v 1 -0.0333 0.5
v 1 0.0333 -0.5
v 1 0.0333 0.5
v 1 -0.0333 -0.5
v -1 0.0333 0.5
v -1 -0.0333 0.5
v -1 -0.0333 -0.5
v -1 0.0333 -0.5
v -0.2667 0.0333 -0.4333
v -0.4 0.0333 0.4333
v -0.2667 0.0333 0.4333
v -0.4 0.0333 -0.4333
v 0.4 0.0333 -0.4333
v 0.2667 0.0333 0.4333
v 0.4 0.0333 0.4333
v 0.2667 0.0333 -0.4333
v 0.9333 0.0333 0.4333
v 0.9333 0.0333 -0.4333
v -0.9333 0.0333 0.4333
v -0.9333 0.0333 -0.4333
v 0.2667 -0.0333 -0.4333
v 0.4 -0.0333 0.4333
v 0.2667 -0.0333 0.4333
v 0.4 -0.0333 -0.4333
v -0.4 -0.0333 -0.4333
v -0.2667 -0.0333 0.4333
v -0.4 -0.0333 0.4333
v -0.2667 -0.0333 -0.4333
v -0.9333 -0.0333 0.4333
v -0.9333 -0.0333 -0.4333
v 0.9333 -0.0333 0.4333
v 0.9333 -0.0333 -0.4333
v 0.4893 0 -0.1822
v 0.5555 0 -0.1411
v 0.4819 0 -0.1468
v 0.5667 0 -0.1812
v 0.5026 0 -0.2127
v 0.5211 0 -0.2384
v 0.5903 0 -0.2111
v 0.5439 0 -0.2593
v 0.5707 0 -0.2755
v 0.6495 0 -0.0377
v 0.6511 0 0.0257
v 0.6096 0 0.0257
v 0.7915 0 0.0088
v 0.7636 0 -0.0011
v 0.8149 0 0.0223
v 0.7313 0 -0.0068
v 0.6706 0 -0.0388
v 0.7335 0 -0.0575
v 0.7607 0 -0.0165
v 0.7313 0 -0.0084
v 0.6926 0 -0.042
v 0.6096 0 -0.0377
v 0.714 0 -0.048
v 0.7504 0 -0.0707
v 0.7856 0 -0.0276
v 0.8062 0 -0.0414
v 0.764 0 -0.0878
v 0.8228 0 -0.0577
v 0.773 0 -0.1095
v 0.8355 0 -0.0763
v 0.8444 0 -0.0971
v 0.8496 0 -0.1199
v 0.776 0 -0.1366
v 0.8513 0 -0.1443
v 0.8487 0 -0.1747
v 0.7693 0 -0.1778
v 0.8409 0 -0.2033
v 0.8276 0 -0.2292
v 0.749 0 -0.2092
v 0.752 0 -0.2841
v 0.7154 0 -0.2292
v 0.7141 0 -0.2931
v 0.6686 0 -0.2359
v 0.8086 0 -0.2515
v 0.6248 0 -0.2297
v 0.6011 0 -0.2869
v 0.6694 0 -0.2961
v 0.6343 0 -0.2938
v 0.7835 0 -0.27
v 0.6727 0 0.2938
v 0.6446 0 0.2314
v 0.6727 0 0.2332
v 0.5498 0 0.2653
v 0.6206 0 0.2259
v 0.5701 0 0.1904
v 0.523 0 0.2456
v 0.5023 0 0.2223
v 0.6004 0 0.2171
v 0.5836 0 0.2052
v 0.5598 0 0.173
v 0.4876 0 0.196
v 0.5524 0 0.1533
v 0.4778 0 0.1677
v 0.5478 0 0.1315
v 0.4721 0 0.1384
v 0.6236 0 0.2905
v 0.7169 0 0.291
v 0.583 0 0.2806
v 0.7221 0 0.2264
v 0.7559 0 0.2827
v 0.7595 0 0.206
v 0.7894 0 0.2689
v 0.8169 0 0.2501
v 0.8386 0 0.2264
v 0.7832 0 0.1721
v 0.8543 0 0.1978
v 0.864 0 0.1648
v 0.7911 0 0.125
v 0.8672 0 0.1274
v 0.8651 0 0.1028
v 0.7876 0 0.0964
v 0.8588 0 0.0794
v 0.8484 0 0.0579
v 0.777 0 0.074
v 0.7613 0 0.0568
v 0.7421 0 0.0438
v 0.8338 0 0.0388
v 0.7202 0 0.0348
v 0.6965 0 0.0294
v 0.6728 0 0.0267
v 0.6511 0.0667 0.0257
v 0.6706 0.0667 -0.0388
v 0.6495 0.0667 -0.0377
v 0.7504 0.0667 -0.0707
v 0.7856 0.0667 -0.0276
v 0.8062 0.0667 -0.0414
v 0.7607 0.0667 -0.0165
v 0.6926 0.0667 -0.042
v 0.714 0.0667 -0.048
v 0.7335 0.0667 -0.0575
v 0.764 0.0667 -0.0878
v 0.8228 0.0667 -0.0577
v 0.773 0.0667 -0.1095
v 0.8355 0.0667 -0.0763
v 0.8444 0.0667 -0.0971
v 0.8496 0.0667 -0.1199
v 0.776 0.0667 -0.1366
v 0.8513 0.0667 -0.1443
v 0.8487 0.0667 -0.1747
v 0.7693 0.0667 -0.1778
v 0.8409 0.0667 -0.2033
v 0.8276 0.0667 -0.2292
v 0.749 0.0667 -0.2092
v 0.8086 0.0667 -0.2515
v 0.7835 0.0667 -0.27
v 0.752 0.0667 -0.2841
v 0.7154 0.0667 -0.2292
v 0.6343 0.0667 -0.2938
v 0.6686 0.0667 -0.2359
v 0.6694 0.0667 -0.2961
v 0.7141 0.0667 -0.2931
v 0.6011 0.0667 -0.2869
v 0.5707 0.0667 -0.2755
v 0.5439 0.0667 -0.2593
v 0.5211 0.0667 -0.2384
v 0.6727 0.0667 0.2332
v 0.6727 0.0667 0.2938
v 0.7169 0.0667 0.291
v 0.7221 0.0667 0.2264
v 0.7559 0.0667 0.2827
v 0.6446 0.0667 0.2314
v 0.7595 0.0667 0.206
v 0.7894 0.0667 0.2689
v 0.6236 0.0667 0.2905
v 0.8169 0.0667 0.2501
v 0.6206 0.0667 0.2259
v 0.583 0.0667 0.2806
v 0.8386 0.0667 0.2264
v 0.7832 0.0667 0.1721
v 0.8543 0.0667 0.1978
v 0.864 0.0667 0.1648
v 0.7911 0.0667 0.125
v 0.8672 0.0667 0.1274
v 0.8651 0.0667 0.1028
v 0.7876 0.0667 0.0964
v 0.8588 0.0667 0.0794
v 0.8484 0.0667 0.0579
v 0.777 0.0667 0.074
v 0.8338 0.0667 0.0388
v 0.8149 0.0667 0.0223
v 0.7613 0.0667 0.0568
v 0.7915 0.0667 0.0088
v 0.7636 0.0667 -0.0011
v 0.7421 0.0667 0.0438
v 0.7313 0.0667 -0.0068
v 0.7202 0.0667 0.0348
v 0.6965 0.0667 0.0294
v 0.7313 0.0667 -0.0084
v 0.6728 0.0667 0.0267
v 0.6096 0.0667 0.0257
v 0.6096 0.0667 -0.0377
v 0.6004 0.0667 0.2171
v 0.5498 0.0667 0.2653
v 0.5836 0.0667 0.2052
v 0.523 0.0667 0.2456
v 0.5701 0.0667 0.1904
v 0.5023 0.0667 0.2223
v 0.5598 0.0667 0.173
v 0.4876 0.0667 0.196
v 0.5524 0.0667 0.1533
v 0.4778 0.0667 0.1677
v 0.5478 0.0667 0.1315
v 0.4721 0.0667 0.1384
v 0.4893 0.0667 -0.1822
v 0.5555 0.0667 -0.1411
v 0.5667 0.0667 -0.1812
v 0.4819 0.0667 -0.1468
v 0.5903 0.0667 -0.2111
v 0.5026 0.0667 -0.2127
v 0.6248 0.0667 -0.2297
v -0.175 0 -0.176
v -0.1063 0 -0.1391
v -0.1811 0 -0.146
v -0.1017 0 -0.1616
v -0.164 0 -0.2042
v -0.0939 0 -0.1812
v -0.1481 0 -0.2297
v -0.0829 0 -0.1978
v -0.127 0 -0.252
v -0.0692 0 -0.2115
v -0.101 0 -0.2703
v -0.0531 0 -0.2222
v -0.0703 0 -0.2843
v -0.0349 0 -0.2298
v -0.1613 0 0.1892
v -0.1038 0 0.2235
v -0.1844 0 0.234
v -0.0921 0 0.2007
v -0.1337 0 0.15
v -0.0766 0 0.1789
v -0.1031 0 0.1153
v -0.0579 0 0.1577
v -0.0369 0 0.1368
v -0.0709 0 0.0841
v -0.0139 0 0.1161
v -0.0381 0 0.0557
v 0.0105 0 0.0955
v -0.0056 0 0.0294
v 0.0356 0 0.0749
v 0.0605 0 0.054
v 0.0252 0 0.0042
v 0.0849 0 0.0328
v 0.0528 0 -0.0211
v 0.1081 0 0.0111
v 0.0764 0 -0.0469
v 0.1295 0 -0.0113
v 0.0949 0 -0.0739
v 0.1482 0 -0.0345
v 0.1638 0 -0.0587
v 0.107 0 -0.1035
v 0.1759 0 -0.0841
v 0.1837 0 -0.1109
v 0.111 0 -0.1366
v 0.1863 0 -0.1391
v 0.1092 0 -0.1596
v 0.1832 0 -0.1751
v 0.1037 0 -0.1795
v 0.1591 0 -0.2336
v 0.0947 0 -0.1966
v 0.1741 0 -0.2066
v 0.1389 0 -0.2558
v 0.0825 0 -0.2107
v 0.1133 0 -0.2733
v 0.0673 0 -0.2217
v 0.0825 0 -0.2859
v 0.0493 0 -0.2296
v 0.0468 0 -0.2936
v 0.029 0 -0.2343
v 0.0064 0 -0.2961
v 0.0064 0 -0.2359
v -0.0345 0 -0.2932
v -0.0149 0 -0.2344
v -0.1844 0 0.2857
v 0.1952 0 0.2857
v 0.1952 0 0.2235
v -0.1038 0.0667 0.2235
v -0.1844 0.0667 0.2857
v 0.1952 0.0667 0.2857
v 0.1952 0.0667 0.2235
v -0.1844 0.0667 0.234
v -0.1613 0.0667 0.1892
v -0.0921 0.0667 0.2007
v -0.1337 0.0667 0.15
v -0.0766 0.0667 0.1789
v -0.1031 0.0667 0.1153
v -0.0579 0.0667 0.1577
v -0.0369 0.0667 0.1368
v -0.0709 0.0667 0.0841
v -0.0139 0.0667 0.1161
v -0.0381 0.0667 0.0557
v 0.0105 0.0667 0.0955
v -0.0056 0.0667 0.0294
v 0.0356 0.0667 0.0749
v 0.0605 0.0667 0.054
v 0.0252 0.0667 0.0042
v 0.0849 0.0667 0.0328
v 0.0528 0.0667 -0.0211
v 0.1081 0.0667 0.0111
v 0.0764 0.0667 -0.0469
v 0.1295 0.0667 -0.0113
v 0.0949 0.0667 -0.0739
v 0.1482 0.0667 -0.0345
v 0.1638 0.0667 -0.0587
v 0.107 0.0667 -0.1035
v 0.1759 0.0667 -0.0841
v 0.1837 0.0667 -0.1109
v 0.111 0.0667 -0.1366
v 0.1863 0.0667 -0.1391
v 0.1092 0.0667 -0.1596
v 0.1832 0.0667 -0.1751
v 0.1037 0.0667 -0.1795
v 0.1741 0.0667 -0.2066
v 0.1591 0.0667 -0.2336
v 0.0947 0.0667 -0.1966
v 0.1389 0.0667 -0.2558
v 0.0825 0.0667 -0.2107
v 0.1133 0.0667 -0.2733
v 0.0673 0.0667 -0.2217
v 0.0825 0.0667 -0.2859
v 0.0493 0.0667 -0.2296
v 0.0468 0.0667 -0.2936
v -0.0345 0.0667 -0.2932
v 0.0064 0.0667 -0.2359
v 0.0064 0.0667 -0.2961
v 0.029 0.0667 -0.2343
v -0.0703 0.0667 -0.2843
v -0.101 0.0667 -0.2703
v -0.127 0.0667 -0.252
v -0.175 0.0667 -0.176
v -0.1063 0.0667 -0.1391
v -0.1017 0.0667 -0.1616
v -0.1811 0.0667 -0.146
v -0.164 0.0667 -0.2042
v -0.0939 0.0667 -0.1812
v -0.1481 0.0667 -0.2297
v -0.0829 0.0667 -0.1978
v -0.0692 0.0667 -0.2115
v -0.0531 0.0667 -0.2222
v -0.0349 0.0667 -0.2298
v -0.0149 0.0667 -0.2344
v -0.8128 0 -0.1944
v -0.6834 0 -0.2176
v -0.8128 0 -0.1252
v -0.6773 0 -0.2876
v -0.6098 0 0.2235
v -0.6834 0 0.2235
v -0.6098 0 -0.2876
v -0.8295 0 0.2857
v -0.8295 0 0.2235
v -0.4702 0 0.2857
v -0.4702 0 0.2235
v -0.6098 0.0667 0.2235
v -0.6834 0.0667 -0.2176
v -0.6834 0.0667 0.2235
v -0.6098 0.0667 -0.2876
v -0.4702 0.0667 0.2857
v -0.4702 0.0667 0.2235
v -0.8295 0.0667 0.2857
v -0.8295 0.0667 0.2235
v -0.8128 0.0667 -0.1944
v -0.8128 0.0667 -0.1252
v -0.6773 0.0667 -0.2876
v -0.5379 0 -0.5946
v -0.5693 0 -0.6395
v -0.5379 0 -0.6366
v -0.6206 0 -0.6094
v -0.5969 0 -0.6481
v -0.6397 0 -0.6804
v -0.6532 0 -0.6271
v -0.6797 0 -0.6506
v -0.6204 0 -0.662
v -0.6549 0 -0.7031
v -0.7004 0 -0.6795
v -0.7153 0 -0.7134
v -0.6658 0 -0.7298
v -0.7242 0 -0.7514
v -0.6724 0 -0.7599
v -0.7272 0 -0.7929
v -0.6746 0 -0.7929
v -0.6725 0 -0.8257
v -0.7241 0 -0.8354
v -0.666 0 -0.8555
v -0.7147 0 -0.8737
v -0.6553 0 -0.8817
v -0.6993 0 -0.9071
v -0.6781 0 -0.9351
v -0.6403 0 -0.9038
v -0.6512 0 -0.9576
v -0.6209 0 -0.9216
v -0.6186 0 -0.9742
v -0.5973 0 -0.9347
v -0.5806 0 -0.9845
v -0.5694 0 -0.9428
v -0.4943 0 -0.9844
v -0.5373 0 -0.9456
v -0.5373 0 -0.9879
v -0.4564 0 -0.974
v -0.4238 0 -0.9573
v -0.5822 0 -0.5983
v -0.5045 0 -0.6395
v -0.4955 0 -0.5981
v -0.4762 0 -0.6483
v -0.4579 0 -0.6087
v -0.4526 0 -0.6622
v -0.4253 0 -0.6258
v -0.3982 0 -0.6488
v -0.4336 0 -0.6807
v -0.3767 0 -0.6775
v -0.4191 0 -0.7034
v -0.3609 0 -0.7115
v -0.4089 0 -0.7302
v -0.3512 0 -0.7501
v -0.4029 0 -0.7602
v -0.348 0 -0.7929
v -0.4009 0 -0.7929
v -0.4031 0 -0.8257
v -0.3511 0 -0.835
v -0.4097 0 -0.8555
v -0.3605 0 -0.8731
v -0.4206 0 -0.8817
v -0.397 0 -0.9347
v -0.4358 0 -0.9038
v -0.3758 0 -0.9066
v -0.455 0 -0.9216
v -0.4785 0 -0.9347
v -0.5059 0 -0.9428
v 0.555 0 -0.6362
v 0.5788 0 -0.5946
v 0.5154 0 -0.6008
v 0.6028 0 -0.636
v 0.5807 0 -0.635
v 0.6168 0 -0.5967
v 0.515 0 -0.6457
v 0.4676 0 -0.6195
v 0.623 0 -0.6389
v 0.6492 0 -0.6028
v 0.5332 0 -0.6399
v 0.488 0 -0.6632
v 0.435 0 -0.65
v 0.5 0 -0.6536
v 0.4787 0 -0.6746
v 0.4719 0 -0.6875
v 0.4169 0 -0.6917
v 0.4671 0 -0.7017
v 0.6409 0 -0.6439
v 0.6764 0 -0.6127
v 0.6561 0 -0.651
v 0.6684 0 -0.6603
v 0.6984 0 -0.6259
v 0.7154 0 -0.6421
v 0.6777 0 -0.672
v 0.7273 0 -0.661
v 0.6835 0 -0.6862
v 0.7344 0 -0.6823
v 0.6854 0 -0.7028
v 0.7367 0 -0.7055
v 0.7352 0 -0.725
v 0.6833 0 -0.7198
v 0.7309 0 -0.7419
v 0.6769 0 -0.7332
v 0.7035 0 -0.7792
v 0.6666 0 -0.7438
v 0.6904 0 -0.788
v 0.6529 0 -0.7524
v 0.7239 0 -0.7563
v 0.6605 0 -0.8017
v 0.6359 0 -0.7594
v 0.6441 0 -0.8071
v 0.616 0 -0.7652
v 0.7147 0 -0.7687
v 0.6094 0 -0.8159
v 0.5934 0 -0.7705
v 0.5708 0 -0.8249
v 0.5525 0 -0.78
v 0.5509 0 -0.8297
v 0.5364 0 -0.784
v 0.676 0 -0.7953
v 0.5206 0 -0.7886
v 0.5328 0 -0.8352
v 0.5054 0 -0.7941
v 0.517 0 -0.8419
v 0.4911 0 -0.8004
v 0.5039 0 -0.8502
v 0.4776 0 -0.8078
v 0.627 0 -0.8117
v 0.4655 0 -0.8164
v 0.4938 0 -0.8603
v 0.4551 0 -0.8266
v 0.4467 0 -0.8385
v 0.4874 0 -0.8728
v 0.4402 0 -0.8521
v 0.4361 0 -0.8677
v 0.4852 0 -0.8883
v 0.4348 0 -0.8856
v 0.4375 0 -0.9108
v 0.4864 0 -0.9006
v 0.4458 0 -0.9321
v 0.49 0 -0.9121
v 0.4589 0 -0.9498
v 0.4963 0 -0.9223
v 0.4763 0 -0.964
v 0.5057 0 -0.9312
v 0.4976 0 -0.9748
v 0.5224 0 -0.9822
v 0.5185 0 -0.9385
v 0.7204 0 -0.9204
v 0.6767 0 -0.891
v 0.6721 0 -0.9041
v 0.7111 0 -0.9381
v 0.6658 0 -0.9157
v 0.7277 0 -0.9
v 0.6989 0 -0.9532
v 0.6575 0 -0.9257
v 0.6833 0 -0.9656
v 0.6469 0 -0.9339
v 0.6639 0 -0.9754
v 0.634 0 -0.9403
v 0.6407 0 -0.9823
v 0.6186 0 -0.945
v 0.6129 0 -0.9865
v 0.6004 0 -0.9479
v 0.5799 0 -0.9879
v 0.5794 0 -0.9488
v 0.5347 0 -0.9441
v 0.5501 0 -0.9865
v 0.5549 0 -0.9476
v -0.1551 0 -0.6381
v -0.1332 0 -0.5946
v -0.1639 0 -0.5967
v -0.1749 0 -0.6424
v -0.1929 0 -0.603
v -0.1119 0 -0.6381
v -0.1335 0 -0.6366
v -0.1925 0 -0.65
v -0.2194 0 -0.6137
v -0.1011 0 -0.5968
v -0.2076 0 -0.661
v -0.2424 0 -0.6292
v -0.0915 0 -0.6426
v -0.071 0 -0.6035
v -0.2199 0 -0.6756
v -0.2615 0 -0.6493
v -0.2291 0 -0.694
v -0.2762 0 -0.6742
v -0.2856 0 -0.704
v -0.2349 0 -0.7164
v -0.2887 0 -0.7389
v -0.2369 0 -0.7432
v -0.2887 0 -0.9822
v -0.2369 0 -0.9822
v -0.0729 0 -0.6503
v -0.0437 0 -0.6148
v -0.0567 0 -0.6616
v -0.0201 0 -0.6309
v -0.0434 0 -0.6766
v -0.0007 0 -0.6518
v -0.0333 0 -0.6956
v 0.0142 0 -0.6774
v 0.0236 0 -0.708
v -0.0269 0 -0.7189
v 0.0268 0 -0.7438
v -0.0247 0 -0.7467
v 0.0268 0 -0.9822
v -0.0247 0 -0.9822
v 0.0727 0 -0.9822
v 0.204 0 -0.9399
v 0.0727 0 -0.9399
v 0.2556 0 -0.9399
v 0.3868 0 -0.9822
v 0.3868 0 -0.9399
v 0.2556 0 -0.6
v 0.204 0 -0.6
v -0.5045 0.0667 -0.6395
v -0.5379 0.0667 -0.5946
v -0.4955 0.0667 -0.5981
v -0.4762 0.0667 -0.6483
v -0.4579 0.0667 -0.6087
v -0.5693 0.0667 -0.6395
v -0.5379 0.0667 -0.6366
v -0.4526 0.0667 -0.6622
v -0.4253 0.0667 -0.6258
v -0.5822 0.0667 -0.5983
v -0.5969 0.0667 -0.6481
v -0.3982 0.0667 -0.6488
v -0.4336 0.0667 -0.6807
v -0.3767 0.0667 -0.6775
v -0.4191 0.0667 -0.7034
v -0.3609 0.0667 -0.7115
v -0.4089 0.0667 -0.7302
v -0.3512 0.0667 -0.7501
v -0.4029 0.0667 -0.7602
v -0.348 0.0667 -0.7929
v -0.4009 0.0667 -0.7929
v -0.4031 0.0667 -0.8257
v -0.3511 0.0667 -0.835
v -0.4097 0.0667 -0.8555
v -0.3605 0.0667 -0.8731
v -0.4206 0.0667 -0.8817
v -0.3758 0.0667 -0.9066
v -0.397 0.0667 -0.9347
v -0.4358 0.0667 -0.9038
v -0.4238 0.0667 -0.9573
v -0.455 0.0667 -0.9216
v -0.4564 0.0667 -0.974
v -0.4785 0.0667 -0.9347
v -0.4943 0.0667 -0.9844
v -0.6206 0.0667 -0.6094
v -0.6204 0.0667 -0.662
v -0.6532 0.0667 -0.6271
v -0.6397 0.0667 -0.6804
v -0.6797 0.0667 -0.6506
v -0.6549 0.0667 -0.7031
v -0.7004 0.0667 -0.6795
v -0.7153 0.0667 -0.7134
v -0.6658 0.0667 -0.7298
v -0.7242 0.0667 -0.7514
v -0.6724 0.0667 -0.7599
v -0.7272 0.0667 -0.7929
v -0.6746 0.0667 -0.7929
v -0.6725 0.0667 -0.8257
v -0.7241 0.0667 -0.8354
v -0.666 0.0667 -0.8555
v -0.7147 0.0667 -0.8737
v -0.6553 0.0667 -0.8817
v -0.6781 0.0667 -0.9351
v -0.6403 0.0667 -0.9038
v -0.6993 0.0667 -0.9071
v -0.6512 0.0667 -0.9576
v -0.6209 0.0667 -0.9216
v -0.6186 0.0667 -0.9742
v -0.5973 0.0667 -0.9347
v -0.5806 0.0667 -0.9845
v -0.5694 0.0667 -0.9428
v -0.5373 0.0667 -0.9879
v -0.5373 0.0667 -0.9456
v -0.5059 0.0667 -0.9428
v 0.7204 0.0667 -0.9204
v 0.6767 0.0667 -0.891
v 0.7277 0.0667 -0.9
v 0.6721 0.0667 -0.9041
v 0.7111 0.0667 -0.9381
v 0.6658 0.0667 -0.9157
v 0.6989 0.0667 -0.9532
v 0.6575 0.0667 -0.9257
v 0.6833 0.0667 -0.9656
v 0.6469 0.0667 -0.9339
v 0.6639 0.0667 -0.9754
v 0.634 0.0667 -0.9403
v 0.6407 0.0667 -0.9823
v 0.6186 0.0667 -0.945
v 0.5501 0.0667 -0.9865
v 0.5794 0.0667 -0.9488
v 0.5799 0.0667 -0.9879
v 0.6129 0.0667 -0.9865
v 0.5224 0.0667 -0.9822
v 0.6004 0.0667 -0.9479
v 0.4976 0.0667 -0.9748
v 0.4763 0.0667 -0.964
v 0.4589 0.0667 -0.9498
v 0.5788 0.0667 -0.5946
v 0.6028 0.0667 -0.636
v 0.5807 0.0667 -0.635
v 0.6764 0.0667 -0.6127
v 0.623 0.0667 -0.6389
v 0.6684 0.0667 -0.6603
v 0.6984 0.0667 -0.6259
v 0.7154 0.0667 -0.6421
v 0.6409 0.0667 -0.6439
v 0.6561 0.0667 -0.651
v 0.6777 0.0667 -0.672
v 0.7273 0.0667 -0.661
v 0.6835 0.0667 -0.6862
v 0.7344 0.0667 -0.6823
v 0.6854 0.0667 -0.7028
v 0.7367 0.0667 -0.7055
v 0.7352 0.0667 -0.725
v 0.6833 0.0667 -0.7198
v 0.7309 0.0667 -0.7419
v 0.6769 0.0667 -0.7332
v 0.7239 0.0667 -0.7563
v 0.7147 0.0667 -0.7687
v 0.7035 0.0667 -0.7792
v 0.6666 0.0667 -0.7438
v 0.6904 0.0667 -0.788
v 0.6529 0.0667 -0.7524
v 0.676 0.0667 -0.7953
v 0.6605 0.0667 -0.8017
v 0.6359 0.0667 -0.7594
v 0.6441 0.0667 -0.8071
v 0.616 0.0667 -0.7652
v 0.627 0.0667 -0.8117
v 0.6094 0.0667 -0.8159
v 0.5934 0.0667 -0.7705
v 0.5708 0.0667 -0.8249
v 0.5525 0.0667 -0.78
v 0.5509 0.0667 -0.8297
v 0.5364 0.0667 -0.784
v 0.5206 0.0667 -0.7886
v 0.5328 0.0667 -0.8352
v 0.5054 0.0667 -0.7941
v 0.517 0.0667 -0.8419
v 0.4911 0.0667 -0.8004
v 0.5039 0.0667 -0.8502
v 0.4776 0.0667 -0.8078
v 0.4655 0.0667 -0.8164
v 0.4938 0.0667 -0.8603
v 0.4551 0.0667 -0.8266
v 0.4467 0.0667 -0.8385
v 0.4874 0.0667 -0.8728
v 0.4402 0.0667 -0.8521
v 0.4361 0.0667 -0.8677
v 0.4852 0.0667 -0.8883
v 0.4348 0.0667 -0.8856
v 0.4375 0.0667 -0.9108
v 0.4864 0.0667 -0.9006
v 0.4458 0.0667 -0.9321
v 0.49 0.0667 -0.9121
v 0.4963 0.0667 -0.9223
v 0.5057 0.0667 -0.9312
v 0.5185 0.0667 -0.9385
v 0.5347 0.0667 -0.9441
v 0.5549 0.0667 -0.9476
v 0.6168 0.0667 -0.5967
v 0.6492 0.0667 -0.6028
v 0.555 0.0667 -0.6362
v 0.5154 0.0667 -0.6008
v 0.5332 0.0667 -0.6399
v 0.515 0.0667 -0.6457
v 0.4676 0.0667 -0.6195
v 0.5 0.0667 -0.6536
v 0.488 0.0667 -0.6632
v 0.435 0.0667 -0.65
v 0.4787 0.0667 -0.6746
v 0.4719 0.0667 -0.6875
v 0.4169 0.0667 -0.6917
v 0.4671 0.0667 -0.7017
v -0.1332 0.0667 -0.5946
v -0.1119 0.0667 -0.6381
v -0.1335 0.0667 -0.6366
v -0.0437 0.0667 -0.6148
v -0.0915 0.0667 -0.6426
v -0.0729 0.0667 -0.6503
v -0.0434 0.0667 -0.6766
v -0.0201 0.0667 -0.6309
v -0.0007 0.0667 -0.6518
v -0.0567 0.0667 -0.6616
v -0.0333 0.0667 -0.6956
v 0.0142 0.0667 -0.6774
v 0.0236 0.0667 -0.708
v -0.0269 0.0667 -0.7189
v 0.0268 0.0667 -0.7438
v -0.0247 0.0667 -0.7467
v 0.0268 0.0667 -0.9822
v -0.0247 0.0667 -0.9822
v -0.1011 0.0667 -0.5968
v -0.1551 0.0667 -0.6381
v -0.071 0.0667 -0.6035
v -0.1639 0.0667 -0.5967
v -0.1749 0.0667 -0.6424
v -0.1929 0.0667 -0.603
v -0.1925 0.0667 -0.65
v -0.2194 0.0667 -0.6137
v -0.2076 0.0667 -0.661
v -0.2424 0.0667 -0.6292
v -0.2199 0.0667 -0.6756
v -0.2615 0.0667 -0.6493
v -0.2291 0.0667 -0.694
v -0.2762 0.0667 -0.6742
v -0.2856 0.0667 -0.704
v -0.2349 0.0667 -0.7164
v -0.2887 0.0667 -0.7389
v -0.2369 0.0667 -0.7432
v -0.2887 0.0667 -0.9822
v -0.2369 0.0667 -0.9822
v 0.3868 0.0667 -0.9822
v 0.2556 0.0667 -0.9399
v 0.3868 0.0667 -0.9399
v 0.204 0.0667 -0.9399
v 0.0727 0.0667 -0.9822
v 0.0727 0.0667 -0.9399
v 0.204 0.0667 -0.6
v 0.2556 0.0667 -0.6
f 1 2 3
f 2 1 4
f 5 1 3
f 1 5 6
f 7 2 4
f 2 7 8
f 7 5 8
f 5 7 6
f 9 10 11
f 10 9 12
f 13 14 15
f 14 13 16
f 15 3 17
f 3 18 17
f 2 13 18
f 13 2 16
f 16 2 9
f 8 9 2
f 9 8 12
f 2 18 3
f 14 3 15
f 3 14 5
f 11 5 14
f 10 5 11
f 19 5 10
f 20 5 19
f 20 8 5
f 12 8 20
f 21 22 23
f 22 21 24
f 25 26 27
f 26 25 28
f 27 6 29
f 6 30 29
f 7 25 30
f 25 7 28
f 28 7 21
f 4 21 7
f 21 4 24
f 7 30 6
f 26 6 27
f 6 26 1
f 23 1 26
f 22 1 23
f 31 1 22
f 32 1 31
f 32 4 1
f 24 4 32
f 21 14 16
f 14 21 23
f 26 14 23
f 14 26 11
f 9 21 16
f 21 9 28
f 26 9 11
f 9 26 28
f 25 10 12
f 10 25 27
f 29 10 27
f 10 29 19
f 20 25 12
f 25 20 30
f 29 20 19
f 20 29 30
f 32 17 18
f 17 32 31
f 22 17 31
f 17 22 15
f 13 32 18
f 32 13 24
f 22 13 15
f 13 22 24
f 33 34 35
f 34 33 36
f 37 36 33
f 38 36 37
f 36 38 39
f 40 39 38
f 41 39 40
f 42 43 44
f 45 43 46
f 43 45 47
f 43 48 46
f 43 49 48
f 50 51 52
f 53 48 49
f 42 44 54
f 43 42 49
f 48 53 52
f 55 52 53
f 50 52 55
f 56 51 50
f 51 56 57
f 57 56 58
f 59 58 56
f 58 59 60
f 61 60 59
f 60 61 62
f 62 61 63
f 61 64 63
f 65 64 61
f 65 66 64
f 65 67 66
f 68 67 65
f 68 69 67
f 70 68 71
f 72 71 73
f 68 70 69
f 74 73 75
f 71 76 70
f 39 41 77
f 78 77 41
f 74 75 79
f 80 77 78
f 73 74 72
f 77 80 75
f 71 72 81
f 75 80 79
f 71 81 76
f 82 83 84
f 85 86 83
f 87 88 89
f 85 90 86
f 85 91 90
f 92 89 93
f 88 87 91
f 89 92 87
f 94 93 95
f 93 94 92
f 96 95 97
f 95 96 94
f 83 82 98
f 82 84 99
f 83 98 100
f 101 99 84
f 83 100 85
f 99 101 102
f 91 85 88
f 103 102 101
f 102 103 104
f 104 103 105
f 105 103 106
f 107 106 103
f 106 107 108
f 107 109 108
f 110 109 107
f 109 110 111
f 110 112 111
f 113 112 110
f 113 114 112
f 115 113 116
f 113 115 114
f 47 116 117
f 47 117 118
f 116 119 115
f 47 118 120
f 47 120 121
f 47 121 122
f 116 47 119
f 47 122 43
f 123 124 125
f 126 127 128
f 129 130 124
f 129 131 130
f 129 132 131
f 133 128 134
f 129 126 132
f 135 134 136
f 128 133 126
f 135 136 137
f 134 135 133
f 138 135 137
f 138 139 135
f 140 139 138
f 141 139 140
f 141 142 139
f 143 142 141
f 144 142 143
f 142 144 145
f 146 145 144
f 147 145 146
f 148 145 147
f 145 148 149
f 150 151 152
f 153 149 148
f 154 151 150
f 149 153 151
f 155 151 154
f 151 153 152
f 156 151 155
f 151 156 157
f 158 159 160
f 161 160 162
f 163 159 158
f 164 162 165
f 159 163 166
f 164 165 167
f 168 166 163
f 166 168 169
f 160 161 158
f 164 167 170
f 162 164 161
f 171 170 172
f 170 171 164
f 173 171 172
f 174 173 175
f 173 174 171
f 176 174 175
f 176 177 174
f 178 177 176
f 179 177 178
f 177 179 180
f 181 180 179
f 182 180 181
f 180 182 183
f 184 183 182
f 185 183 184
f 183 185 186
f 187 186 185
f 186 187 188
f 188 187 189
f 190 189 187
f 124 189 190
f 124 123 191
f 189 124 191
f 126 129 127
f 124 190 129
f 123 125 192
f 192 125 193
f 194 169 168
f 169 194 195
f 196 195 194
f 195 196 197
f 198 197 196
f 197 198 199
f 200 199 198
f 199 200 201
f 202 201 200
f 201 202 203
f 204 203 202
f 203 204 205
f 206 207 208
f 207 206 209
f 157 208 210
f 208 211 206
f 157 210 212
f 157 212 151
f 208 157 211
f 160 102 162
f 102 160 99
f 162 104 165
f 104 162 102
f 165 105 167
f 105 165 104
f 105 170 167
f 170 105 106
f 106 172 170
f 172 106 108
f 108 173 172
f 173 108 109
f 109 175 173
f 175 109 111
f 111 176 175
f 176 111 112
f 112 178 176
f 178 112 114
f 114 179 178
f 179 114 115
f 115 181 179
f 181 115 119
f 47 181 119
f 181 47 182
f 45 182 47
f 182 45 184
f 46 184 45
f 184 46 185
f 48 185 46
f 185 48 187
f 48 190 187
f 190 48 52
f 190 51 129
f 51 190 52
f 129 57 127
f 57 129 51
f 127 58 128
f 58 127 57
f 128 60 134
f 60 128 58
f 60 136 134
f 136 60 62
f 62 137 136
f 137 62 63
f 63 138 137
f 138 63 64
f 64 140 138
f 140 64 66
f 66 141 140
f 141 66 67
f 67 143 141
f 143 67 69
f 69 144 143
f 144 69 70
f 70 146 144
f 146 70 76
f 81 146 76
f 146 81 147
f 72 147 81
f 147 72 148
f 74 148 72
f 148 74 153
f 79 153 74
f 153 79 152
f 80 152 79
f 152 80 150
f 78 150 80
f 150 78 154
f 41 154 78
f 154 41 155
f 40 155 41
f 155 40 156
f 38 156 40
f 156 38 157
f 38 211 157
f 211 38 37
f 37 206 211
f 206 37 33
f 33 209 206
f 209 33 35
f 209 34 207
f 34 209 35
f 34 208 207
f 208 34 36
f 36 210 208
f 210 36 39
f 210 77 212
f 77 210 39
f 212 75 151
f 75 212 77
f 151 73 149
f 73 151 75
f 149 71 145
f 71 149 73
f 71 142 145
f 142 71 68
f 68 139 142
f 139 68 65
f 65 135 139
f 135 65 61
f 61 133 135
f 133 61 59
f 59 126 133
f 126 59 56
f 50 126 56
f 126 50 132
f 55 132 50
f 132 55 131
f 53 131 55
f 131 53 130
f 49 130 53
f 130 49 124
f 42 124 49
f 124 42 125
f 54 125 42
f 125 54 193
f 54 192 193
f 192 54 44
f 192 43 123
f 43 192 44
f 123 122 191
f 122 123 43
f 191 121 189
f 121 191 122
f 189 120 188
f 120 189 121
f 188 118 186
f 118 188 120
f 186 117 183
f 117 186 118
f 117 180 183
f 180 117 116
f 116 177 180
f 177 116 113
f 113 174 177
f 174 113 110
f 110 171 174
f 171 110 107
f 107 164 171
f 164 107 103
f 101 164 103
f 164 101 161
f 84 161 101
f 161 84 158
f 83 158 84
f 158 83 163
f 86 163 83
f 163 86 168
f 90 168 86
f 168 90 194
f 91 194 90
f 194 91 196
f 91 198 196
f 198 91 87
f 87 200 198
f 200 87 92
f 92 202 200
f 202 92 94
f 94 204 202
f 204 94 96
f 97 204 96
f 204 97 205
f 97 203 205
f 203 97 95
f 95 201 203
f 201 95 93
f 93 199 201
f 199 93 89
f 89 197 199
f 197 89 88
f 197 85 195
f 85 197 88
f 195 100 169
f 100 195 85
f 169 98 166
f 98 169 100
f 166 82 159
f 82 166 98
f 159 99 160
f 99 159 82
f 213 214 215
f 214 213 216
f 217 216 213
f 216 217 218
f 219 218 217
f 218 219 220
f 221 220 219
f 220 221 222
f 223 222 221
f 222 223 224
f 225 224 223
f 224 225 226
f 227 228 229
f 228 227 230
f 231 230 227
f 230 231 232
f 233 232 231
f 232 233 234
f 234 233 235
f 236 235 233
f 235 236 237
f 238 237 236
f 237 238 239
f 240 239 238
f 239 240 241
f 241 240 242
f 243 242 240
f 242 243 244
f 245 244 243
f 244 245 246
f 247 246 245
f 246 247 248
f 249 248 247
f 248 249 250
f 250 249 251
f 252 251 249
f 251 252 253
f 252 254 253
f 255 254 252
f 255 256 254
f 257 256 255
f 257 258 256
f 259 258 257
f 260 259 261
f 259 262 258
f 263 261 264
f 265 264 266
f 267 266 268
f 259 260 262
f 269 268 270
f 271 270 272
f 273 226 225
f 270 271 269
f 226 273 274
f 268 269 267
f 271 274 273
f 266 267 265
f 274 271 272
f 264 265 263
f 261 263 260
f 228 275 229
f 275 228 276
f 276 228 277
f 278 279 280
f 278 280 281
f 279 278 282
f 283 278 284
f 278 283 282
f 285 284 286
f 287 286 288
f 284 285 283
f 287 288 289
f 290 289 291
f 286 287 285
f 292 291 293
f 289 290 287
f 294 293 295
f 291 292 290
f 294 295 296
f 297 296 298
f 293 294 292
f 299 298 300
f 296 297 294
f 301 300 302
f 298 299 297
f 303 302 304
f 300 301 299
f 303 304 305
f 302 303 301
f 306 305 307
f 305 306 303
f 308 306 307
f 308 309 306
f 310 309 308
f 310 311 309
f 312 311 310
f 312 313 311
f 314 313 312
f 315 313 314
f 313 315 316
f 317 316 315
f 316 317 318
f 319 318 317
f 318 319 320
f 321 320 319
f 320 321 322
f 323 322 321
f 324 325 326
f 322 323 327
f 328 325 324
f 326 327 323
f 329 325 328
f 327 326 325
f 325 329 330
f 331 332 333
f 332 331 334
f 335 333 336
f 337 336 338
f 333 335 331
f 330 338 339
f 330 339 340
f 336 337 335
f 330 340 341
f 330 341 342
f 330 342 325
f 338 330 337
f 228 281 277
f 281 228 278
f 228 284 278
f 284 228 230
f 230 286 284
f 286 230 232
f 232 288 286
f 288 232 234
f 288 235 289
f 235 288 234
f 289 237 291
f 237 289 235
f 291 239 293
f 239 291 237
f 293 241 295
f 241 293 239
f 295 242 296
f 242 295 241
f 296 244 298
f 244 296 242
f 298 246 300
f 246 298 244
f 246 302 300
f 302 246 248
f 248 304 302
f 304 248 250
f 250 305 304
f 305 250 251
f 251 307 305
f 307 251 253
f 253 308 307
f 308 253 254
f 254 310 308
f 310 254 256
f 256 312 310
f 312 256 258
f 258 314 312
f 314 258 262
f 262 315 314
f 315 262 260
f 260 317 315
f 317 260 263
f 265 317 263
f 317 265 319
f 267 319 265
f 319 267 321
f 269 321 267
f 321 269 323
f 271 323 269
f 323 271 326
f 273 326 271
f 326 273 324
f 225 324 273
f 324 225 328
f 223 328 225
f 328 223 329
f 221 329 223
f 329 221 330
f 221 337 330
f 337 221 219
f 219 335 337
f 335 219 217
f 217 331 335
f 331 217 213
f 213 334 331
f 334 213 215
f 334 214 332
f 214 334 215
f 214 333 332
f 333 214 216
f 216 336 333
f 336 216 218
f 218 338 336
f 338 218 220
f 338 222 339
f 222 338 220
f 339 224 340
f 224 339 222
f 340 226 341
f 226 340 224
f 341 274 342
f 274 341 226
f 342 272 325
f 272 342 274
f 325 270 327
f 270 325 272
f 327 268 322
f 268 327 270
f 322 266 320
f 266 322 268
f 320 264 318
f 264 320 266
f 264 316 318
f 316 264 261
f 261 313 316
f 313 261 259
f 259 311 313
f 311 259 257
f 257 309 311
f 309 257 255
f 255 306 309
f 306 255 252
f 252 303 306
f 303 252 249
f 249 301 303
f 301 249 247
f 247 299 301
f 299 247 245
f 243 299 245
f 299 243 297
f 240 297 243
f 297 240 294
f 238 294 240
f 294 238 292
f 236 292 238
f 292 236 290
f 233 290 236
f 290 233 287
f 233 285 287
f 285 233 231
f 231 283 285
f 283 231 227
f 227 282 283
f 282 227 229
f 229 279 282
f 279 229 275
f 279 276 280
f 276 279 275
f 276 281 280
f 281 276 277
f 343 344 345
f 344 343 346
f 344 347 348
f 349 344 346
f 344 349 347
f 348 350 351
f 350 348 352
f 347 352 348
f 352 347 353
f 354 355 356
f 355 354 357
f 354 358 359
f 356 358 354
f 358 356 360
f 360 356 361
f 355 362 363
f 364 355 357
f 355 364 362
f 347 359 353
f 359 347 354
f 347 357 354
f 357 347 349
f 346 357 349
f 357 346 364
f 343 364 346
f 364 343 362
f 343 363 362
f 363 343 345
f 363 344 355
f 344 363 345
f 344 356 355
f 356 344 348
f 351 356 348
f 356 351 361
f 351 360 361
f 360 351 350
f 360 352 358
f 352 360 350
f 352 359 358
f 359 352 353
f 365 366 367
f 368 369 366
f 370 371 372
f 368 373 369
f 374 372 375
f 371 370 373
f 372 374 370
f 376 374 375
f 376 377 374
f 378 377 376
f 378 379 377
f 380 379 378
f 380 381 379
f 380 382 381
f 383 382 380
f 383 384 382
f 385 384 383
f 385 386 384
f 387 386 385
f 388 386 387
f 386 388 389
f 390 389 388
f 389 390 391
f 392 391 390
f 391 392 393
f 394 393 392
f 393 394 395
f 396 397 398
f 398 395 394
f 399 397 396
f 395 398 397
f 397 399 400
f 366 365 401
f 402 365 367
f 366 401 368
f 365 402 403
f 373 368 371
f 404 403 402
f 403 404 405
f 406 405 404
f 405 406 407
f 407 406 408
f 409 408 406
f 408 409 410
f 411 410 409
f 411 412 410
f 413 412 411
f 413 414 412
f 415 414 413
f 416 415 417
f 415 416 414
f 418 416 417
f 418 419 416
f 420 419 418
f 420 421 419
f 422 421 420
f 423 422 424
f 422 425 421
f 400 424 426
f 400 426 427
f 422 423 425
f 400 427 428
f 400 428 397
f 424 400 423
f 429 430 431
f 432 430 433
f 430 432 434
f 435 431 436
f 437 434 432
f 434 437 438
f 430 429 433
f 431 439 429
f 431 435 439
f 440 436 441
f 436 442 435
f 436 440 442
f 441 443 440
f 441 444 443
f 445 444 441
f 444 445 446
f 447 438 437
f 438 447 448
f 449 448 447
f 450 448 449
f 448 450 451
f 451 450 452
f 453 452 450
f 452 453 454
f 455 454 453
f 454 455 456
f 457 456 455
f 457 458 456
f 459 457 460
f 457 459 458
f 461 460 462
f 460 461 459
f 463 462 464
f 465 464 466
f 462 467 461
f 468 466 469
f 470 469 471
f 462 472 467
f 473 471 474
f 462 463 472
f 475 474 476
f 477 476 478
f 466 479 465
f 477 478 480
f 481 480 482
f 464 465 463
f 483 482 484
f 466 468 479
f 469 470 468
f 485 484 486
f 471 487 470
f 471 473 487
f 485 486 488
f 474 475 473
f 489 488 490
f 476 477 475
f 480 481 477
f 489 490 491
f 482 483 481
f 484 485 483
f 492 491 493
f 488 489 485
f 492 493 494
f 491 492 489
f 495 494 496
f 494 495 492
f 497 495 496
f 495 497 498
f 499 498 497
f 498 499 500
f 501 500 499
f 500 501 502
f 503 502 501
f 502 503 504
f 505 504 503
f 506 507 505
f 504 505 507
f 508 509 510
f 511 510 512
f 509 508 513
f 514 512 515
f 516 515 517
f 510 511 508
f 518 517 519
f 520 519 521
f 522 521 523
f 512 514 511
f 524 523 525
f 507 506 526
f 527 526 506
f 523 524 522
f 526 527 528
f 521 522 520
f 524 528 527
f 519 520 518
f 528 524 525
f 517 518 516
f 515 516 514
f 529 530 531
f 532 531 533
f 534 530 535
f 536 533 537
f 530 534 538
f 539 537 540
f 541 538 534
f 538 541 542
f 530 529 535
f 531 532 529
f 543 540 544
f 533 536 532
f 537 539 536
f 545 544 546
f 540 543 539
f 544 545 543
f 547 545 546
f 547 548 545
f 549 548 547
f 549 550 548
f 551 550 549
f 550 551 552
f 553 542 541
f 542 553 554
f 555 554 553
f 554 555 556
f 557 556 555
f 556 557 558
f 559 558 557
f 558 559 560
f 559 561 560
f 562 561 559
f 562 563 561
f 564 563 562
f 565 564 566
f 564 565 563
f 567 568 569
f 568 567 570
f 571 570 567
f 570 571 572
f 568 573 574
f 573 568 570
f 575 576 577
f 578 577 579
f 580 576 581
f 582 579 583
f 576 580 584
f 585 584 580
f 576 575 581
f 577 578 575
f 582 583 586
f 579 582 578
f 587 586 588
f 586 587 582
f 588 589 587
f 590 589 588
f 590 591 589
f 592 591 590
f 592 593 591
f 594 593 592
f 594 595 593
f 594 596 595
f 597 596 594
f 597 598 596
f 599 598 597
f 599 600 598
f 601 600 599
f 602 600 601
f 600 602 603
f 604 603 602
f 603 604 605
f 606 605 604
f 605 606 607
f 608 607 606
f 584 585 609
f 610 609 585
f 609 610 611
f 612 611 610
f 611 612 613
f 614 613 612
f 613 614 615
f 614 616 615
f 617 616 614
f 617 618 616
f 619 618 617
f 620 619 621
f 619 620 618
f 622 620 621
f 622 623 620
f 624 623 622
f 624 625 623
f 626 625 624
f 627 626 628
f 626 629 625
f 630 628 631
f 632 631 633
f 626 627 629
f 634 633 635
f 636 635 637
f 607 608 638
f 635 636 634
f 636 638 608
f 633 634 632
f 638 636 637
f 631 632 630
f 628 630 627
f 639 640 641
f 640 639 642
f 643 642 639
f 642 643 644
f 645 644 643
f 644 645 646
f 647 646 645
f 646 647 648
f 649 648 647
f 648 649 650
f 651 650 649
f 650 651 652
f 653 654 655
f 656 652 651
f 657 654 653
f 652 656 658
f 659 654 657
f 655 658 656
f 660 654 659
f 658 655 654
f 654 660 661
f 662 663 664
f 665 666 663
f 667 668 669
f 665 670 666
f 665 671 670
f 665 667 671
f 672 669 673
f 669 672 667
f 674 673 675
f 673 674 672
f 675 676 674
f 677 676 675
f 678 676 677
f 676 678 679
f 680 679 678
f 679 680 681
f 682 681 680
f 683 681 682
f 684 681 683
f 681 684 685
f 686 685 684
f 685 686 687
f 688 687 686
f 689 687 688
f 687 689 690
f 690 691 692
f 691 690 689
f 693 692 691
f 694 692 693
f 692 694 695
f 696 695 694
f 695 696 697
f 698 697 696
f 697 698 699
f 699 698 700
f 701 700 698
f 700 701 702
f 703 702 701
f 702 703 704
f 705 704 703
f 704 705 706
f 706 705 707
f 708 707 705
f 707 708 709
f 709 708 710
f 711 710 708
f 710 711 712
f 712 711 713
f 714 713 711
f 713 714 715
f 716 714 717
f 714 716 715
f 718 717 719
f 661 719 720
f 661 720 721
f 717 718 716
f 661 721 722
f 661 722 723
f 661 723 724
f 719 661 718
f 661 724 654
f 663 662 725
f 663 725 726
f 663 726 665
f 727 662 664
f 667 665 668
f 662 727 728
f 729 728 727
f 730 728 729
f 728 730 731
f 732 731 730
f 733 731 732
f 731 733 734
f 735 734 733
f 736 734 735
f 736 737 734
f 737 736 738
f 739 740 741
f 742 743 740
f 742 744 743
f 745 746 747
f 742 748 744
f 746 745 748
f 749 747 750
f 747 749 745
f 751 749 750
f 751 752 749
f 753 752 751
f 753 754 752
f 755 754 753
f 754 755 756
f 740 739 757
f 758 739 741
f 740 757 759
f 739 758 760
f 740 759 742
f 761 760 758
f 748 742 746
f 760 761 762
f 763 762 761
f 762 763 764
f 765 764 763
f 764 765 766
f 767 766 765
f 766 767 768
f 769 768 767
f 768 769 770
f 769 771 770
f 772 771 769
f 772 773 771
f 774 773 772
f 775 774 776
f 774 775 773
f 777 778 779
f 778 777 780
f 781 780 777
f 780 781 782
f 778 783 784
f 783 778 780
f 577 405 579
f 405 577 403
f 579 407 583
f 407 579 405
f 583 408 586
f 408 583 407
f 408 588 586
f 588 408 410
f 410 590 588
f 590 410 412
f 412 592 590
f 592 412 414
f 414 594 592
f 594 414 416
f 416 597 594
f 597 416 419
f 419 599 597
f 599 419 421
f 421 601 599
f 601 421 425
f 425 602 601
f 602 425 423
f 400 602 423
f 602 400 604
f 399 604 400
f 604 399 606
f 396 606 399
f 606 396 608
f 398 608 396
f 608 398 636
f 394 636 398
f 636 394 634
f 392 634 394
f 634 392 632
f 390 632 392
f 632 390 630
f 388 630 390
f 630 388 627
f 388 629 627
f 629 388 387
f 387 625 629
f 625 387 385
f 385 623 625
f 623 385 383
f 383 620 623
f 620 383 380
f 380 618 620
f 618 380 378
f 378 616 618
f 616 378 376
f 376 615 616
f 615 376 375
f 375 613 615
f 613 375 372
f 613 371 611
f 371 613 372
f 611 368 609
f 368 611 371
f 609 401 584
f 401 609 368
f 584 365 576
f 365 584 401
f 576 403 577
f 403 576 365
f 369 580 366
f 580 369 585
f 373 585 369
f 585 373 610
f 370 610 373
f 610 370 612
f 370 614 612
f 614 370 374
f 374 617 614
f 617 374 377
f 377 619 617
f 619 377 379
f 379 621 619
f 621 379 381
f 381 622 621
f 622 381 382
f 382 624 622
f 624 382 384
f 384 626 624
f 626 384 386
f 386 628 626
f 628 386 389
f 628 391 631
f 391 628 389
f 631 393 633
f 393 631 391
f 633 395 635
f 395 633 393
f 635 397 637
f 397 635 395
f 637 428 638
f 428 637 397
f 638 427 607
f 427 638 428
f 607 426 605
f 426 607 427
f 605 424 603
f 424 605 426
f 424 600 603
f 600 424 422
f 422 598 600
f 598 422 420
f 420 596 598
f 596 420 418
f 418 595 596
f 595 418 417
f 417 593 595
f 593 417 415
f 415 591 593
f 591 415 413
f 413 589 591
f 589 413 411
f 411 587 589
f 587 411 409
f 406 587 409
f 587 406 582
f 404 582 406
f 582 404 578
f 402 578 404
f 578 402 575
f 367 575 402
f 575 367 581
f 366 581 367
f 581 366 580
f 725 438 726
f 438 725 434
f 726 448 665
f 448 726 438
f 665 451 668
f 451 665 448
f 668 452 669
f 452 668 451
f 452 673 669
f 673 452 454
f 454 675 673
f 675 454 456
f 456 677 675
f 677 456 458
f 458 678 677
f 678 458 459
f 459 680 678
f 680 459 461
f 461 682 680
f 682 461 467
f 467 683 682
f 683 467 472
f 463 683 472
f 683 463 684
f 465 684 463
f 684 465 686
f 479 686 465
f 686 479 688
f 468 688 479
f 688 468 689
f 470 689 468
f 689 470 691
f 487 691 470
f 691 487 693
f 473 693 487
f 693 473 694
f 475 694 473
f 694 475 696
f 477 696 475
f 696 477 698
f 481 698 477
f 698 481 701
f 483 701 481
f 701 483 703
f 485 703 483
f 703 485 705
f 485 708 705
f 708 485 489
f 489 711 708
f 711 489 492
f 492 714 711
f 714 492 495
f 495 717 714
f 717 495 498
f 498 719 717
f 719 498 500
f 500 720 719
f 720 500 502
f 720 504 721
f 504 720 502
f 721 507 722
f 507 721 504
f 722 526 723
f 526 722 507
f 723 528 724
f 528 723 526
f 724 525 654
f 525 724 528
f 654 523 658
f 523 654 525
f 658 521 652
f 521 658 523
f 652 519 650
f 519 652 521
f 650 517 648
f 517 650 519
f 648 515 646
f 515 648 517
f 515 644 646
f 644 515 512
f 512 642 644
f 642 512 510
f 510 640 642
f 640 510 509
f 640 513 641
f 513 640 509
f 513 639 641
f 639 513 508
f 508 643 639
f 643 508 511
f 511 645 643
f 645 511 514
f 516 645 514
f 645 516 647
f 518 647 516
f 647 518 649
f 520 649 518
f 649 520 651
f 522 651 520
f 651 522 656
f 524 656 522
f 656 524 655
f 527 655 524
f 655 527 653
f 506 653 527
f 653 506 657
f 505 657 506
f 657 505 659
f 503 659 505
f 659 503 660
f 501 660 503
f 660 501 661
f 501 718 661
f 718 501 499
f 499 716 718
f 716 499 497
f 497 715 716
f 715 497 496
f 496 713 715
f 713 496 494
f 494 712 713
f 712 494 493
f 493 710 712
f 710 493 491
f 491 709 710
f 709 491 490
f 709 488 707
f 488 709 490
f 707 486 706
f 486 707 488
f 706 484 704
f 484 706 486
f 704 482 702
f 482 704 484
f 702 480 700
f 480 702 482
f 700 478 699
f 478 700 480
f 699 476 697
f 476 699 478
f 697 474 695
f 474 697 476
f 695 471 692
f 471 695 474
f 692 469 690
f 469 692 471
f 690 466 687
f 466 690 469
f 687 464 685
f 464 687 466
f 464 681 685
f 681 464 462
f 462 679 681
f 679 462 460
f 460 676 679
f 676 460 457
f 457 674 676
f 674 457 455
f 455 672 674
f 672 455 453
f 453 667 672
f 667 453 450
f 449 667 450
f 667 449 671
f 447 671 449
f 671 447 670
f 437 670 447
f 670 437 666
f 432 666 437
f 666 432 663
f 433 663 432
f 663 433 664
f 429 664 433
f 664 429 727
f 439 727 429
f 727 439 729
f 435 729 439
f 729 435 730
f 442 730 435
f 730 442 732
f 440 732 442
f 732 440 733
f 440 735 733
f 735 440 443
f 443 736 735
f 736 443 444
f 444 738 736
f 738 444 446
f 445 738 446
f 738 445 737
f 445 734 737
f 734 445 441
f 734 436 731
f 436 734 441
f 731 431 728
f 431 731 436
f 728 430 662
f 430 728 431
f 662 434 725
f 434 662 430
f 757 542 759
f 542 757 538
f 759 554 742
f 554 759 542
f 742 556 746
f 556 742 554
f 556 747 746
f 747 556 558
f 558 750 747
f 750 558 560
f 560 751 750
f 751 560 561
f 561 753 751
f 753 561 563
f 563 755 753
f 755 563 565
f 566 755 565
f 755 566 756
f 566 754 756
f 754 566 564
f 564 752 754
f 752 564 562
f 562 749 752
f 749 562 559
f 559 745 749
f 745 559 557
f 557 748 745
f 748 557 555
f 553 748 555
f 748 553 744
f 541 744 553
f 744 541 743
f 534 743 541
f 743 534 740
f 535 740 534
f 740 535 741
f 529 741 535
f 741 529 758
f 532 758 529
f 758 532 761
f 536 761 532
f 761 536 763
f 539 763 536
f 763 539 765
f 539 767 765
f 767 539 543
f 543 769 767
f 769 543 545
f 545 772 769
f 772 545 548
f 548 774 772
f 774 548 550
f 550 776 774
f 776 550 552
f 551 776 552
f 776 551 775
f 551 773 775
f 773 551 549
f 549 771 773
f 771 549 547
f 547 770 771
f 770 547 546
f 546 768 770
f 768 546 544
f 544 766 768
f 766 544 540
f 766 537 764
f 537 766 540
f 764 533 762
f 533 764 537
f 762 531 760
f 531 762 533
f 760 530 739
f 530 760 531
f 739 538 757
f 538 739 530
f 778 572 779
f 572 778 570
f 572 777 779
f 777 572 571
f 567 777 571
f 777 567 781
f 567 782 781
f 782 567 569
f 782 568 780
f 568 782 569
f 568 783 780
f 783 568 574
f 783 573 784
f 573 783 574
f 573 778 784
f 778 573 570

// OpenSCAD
$fa = 1;
$fs = 0.4;
mag = 1 / 15;
thickness = mag * 1;
height = mag * 15;
width = mag * 10;
border = mag * 1;
difference() {
cube([3 * width,thickness,height], center = true);
{    
cube([width - 2 * border, thickness, height - 2 * border], center = true);
translate([-width, 0, 0])
    cube([width - 2 * border, thickness, height - 2 * border], center = true);
translate([width, 0, 0])    
    cube([width - 2 * border, thickness, height - 2 * border], center = true);
}
}
translate([width,0,height/3.5])
rotate([-90,0,0])
  linear_extrude(height = thickness)
  text("3", size = 0.6, halign = "center");
translate([0,0,height/3.5])
rotate([-90,0,0])
  linear_extrude(height = thickness)
  text("2", size = 0.6, halign = "center");
translate([-width,0,height/3.5])
rotate([-90,0,0])
  linear_extrude(height = thickness)
  text("1", size = 0.6, halign = "center");
translate([0,0,-height*0.6])
rotate([-90,0,0])
  linear_extrude(height = thickness)
  text("OUTS", size = 0.4, halign = "center");
